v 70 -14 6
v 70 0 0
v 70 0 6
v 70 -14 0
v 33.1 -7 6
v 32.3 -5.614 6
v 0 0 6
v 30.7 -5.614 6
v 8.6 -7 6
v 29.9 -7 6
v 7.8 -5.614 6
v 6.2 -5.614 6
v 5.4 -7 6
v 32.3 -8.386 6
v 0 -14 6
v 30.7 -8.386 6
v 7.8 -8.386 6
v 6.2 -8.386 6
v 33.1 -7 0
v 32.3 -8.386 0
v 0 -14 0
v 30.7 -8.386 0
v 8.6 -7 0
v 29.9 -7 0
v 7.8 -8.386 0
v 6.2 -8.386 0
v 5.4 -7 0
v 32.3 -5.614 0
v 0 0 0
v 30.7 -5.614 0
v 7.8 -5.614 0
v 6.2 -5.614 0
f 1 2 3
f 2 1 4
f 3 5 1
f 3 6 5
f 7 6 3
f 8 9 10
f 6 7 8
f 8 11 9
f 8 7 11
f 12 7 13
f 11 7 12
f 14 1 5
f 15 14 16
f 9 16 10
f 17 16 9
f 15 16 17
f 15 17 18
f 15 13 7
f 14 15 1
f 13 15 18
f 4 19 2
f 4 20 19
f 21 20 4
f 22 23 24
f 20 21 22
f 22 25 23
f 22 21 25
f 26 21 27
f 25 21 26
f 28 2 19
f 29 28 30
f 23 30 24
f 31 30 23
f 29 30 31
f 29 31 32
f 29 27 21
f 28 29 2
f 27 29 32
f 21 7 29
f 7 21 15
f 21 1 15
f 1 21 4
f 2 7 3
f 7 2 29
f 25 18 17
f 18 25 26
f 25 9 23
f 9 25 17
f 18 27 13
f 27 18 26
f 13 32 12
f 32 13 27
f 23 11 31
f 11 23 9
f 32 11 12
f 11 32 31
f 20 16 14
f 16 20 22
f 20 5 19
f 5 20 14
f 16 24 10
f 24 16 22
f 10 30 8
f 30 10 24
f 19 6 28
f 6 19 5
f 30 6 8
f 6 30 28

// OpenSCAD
module gr_jaw_left() {
  mirror([0,1,0]) {
    len=70.0; w=14.0; t=6.0;
    difference() {
      cube([len,w,t], center=false);
      translate([w/2, w/2, -1]) cylinder(h=t+2, d=3.2, center=false);
      translate([31.50, w/2, -1]) cylinder(h=t+2, d=3.2, center=false);
    }
  }
}
gr_jaw_left();
